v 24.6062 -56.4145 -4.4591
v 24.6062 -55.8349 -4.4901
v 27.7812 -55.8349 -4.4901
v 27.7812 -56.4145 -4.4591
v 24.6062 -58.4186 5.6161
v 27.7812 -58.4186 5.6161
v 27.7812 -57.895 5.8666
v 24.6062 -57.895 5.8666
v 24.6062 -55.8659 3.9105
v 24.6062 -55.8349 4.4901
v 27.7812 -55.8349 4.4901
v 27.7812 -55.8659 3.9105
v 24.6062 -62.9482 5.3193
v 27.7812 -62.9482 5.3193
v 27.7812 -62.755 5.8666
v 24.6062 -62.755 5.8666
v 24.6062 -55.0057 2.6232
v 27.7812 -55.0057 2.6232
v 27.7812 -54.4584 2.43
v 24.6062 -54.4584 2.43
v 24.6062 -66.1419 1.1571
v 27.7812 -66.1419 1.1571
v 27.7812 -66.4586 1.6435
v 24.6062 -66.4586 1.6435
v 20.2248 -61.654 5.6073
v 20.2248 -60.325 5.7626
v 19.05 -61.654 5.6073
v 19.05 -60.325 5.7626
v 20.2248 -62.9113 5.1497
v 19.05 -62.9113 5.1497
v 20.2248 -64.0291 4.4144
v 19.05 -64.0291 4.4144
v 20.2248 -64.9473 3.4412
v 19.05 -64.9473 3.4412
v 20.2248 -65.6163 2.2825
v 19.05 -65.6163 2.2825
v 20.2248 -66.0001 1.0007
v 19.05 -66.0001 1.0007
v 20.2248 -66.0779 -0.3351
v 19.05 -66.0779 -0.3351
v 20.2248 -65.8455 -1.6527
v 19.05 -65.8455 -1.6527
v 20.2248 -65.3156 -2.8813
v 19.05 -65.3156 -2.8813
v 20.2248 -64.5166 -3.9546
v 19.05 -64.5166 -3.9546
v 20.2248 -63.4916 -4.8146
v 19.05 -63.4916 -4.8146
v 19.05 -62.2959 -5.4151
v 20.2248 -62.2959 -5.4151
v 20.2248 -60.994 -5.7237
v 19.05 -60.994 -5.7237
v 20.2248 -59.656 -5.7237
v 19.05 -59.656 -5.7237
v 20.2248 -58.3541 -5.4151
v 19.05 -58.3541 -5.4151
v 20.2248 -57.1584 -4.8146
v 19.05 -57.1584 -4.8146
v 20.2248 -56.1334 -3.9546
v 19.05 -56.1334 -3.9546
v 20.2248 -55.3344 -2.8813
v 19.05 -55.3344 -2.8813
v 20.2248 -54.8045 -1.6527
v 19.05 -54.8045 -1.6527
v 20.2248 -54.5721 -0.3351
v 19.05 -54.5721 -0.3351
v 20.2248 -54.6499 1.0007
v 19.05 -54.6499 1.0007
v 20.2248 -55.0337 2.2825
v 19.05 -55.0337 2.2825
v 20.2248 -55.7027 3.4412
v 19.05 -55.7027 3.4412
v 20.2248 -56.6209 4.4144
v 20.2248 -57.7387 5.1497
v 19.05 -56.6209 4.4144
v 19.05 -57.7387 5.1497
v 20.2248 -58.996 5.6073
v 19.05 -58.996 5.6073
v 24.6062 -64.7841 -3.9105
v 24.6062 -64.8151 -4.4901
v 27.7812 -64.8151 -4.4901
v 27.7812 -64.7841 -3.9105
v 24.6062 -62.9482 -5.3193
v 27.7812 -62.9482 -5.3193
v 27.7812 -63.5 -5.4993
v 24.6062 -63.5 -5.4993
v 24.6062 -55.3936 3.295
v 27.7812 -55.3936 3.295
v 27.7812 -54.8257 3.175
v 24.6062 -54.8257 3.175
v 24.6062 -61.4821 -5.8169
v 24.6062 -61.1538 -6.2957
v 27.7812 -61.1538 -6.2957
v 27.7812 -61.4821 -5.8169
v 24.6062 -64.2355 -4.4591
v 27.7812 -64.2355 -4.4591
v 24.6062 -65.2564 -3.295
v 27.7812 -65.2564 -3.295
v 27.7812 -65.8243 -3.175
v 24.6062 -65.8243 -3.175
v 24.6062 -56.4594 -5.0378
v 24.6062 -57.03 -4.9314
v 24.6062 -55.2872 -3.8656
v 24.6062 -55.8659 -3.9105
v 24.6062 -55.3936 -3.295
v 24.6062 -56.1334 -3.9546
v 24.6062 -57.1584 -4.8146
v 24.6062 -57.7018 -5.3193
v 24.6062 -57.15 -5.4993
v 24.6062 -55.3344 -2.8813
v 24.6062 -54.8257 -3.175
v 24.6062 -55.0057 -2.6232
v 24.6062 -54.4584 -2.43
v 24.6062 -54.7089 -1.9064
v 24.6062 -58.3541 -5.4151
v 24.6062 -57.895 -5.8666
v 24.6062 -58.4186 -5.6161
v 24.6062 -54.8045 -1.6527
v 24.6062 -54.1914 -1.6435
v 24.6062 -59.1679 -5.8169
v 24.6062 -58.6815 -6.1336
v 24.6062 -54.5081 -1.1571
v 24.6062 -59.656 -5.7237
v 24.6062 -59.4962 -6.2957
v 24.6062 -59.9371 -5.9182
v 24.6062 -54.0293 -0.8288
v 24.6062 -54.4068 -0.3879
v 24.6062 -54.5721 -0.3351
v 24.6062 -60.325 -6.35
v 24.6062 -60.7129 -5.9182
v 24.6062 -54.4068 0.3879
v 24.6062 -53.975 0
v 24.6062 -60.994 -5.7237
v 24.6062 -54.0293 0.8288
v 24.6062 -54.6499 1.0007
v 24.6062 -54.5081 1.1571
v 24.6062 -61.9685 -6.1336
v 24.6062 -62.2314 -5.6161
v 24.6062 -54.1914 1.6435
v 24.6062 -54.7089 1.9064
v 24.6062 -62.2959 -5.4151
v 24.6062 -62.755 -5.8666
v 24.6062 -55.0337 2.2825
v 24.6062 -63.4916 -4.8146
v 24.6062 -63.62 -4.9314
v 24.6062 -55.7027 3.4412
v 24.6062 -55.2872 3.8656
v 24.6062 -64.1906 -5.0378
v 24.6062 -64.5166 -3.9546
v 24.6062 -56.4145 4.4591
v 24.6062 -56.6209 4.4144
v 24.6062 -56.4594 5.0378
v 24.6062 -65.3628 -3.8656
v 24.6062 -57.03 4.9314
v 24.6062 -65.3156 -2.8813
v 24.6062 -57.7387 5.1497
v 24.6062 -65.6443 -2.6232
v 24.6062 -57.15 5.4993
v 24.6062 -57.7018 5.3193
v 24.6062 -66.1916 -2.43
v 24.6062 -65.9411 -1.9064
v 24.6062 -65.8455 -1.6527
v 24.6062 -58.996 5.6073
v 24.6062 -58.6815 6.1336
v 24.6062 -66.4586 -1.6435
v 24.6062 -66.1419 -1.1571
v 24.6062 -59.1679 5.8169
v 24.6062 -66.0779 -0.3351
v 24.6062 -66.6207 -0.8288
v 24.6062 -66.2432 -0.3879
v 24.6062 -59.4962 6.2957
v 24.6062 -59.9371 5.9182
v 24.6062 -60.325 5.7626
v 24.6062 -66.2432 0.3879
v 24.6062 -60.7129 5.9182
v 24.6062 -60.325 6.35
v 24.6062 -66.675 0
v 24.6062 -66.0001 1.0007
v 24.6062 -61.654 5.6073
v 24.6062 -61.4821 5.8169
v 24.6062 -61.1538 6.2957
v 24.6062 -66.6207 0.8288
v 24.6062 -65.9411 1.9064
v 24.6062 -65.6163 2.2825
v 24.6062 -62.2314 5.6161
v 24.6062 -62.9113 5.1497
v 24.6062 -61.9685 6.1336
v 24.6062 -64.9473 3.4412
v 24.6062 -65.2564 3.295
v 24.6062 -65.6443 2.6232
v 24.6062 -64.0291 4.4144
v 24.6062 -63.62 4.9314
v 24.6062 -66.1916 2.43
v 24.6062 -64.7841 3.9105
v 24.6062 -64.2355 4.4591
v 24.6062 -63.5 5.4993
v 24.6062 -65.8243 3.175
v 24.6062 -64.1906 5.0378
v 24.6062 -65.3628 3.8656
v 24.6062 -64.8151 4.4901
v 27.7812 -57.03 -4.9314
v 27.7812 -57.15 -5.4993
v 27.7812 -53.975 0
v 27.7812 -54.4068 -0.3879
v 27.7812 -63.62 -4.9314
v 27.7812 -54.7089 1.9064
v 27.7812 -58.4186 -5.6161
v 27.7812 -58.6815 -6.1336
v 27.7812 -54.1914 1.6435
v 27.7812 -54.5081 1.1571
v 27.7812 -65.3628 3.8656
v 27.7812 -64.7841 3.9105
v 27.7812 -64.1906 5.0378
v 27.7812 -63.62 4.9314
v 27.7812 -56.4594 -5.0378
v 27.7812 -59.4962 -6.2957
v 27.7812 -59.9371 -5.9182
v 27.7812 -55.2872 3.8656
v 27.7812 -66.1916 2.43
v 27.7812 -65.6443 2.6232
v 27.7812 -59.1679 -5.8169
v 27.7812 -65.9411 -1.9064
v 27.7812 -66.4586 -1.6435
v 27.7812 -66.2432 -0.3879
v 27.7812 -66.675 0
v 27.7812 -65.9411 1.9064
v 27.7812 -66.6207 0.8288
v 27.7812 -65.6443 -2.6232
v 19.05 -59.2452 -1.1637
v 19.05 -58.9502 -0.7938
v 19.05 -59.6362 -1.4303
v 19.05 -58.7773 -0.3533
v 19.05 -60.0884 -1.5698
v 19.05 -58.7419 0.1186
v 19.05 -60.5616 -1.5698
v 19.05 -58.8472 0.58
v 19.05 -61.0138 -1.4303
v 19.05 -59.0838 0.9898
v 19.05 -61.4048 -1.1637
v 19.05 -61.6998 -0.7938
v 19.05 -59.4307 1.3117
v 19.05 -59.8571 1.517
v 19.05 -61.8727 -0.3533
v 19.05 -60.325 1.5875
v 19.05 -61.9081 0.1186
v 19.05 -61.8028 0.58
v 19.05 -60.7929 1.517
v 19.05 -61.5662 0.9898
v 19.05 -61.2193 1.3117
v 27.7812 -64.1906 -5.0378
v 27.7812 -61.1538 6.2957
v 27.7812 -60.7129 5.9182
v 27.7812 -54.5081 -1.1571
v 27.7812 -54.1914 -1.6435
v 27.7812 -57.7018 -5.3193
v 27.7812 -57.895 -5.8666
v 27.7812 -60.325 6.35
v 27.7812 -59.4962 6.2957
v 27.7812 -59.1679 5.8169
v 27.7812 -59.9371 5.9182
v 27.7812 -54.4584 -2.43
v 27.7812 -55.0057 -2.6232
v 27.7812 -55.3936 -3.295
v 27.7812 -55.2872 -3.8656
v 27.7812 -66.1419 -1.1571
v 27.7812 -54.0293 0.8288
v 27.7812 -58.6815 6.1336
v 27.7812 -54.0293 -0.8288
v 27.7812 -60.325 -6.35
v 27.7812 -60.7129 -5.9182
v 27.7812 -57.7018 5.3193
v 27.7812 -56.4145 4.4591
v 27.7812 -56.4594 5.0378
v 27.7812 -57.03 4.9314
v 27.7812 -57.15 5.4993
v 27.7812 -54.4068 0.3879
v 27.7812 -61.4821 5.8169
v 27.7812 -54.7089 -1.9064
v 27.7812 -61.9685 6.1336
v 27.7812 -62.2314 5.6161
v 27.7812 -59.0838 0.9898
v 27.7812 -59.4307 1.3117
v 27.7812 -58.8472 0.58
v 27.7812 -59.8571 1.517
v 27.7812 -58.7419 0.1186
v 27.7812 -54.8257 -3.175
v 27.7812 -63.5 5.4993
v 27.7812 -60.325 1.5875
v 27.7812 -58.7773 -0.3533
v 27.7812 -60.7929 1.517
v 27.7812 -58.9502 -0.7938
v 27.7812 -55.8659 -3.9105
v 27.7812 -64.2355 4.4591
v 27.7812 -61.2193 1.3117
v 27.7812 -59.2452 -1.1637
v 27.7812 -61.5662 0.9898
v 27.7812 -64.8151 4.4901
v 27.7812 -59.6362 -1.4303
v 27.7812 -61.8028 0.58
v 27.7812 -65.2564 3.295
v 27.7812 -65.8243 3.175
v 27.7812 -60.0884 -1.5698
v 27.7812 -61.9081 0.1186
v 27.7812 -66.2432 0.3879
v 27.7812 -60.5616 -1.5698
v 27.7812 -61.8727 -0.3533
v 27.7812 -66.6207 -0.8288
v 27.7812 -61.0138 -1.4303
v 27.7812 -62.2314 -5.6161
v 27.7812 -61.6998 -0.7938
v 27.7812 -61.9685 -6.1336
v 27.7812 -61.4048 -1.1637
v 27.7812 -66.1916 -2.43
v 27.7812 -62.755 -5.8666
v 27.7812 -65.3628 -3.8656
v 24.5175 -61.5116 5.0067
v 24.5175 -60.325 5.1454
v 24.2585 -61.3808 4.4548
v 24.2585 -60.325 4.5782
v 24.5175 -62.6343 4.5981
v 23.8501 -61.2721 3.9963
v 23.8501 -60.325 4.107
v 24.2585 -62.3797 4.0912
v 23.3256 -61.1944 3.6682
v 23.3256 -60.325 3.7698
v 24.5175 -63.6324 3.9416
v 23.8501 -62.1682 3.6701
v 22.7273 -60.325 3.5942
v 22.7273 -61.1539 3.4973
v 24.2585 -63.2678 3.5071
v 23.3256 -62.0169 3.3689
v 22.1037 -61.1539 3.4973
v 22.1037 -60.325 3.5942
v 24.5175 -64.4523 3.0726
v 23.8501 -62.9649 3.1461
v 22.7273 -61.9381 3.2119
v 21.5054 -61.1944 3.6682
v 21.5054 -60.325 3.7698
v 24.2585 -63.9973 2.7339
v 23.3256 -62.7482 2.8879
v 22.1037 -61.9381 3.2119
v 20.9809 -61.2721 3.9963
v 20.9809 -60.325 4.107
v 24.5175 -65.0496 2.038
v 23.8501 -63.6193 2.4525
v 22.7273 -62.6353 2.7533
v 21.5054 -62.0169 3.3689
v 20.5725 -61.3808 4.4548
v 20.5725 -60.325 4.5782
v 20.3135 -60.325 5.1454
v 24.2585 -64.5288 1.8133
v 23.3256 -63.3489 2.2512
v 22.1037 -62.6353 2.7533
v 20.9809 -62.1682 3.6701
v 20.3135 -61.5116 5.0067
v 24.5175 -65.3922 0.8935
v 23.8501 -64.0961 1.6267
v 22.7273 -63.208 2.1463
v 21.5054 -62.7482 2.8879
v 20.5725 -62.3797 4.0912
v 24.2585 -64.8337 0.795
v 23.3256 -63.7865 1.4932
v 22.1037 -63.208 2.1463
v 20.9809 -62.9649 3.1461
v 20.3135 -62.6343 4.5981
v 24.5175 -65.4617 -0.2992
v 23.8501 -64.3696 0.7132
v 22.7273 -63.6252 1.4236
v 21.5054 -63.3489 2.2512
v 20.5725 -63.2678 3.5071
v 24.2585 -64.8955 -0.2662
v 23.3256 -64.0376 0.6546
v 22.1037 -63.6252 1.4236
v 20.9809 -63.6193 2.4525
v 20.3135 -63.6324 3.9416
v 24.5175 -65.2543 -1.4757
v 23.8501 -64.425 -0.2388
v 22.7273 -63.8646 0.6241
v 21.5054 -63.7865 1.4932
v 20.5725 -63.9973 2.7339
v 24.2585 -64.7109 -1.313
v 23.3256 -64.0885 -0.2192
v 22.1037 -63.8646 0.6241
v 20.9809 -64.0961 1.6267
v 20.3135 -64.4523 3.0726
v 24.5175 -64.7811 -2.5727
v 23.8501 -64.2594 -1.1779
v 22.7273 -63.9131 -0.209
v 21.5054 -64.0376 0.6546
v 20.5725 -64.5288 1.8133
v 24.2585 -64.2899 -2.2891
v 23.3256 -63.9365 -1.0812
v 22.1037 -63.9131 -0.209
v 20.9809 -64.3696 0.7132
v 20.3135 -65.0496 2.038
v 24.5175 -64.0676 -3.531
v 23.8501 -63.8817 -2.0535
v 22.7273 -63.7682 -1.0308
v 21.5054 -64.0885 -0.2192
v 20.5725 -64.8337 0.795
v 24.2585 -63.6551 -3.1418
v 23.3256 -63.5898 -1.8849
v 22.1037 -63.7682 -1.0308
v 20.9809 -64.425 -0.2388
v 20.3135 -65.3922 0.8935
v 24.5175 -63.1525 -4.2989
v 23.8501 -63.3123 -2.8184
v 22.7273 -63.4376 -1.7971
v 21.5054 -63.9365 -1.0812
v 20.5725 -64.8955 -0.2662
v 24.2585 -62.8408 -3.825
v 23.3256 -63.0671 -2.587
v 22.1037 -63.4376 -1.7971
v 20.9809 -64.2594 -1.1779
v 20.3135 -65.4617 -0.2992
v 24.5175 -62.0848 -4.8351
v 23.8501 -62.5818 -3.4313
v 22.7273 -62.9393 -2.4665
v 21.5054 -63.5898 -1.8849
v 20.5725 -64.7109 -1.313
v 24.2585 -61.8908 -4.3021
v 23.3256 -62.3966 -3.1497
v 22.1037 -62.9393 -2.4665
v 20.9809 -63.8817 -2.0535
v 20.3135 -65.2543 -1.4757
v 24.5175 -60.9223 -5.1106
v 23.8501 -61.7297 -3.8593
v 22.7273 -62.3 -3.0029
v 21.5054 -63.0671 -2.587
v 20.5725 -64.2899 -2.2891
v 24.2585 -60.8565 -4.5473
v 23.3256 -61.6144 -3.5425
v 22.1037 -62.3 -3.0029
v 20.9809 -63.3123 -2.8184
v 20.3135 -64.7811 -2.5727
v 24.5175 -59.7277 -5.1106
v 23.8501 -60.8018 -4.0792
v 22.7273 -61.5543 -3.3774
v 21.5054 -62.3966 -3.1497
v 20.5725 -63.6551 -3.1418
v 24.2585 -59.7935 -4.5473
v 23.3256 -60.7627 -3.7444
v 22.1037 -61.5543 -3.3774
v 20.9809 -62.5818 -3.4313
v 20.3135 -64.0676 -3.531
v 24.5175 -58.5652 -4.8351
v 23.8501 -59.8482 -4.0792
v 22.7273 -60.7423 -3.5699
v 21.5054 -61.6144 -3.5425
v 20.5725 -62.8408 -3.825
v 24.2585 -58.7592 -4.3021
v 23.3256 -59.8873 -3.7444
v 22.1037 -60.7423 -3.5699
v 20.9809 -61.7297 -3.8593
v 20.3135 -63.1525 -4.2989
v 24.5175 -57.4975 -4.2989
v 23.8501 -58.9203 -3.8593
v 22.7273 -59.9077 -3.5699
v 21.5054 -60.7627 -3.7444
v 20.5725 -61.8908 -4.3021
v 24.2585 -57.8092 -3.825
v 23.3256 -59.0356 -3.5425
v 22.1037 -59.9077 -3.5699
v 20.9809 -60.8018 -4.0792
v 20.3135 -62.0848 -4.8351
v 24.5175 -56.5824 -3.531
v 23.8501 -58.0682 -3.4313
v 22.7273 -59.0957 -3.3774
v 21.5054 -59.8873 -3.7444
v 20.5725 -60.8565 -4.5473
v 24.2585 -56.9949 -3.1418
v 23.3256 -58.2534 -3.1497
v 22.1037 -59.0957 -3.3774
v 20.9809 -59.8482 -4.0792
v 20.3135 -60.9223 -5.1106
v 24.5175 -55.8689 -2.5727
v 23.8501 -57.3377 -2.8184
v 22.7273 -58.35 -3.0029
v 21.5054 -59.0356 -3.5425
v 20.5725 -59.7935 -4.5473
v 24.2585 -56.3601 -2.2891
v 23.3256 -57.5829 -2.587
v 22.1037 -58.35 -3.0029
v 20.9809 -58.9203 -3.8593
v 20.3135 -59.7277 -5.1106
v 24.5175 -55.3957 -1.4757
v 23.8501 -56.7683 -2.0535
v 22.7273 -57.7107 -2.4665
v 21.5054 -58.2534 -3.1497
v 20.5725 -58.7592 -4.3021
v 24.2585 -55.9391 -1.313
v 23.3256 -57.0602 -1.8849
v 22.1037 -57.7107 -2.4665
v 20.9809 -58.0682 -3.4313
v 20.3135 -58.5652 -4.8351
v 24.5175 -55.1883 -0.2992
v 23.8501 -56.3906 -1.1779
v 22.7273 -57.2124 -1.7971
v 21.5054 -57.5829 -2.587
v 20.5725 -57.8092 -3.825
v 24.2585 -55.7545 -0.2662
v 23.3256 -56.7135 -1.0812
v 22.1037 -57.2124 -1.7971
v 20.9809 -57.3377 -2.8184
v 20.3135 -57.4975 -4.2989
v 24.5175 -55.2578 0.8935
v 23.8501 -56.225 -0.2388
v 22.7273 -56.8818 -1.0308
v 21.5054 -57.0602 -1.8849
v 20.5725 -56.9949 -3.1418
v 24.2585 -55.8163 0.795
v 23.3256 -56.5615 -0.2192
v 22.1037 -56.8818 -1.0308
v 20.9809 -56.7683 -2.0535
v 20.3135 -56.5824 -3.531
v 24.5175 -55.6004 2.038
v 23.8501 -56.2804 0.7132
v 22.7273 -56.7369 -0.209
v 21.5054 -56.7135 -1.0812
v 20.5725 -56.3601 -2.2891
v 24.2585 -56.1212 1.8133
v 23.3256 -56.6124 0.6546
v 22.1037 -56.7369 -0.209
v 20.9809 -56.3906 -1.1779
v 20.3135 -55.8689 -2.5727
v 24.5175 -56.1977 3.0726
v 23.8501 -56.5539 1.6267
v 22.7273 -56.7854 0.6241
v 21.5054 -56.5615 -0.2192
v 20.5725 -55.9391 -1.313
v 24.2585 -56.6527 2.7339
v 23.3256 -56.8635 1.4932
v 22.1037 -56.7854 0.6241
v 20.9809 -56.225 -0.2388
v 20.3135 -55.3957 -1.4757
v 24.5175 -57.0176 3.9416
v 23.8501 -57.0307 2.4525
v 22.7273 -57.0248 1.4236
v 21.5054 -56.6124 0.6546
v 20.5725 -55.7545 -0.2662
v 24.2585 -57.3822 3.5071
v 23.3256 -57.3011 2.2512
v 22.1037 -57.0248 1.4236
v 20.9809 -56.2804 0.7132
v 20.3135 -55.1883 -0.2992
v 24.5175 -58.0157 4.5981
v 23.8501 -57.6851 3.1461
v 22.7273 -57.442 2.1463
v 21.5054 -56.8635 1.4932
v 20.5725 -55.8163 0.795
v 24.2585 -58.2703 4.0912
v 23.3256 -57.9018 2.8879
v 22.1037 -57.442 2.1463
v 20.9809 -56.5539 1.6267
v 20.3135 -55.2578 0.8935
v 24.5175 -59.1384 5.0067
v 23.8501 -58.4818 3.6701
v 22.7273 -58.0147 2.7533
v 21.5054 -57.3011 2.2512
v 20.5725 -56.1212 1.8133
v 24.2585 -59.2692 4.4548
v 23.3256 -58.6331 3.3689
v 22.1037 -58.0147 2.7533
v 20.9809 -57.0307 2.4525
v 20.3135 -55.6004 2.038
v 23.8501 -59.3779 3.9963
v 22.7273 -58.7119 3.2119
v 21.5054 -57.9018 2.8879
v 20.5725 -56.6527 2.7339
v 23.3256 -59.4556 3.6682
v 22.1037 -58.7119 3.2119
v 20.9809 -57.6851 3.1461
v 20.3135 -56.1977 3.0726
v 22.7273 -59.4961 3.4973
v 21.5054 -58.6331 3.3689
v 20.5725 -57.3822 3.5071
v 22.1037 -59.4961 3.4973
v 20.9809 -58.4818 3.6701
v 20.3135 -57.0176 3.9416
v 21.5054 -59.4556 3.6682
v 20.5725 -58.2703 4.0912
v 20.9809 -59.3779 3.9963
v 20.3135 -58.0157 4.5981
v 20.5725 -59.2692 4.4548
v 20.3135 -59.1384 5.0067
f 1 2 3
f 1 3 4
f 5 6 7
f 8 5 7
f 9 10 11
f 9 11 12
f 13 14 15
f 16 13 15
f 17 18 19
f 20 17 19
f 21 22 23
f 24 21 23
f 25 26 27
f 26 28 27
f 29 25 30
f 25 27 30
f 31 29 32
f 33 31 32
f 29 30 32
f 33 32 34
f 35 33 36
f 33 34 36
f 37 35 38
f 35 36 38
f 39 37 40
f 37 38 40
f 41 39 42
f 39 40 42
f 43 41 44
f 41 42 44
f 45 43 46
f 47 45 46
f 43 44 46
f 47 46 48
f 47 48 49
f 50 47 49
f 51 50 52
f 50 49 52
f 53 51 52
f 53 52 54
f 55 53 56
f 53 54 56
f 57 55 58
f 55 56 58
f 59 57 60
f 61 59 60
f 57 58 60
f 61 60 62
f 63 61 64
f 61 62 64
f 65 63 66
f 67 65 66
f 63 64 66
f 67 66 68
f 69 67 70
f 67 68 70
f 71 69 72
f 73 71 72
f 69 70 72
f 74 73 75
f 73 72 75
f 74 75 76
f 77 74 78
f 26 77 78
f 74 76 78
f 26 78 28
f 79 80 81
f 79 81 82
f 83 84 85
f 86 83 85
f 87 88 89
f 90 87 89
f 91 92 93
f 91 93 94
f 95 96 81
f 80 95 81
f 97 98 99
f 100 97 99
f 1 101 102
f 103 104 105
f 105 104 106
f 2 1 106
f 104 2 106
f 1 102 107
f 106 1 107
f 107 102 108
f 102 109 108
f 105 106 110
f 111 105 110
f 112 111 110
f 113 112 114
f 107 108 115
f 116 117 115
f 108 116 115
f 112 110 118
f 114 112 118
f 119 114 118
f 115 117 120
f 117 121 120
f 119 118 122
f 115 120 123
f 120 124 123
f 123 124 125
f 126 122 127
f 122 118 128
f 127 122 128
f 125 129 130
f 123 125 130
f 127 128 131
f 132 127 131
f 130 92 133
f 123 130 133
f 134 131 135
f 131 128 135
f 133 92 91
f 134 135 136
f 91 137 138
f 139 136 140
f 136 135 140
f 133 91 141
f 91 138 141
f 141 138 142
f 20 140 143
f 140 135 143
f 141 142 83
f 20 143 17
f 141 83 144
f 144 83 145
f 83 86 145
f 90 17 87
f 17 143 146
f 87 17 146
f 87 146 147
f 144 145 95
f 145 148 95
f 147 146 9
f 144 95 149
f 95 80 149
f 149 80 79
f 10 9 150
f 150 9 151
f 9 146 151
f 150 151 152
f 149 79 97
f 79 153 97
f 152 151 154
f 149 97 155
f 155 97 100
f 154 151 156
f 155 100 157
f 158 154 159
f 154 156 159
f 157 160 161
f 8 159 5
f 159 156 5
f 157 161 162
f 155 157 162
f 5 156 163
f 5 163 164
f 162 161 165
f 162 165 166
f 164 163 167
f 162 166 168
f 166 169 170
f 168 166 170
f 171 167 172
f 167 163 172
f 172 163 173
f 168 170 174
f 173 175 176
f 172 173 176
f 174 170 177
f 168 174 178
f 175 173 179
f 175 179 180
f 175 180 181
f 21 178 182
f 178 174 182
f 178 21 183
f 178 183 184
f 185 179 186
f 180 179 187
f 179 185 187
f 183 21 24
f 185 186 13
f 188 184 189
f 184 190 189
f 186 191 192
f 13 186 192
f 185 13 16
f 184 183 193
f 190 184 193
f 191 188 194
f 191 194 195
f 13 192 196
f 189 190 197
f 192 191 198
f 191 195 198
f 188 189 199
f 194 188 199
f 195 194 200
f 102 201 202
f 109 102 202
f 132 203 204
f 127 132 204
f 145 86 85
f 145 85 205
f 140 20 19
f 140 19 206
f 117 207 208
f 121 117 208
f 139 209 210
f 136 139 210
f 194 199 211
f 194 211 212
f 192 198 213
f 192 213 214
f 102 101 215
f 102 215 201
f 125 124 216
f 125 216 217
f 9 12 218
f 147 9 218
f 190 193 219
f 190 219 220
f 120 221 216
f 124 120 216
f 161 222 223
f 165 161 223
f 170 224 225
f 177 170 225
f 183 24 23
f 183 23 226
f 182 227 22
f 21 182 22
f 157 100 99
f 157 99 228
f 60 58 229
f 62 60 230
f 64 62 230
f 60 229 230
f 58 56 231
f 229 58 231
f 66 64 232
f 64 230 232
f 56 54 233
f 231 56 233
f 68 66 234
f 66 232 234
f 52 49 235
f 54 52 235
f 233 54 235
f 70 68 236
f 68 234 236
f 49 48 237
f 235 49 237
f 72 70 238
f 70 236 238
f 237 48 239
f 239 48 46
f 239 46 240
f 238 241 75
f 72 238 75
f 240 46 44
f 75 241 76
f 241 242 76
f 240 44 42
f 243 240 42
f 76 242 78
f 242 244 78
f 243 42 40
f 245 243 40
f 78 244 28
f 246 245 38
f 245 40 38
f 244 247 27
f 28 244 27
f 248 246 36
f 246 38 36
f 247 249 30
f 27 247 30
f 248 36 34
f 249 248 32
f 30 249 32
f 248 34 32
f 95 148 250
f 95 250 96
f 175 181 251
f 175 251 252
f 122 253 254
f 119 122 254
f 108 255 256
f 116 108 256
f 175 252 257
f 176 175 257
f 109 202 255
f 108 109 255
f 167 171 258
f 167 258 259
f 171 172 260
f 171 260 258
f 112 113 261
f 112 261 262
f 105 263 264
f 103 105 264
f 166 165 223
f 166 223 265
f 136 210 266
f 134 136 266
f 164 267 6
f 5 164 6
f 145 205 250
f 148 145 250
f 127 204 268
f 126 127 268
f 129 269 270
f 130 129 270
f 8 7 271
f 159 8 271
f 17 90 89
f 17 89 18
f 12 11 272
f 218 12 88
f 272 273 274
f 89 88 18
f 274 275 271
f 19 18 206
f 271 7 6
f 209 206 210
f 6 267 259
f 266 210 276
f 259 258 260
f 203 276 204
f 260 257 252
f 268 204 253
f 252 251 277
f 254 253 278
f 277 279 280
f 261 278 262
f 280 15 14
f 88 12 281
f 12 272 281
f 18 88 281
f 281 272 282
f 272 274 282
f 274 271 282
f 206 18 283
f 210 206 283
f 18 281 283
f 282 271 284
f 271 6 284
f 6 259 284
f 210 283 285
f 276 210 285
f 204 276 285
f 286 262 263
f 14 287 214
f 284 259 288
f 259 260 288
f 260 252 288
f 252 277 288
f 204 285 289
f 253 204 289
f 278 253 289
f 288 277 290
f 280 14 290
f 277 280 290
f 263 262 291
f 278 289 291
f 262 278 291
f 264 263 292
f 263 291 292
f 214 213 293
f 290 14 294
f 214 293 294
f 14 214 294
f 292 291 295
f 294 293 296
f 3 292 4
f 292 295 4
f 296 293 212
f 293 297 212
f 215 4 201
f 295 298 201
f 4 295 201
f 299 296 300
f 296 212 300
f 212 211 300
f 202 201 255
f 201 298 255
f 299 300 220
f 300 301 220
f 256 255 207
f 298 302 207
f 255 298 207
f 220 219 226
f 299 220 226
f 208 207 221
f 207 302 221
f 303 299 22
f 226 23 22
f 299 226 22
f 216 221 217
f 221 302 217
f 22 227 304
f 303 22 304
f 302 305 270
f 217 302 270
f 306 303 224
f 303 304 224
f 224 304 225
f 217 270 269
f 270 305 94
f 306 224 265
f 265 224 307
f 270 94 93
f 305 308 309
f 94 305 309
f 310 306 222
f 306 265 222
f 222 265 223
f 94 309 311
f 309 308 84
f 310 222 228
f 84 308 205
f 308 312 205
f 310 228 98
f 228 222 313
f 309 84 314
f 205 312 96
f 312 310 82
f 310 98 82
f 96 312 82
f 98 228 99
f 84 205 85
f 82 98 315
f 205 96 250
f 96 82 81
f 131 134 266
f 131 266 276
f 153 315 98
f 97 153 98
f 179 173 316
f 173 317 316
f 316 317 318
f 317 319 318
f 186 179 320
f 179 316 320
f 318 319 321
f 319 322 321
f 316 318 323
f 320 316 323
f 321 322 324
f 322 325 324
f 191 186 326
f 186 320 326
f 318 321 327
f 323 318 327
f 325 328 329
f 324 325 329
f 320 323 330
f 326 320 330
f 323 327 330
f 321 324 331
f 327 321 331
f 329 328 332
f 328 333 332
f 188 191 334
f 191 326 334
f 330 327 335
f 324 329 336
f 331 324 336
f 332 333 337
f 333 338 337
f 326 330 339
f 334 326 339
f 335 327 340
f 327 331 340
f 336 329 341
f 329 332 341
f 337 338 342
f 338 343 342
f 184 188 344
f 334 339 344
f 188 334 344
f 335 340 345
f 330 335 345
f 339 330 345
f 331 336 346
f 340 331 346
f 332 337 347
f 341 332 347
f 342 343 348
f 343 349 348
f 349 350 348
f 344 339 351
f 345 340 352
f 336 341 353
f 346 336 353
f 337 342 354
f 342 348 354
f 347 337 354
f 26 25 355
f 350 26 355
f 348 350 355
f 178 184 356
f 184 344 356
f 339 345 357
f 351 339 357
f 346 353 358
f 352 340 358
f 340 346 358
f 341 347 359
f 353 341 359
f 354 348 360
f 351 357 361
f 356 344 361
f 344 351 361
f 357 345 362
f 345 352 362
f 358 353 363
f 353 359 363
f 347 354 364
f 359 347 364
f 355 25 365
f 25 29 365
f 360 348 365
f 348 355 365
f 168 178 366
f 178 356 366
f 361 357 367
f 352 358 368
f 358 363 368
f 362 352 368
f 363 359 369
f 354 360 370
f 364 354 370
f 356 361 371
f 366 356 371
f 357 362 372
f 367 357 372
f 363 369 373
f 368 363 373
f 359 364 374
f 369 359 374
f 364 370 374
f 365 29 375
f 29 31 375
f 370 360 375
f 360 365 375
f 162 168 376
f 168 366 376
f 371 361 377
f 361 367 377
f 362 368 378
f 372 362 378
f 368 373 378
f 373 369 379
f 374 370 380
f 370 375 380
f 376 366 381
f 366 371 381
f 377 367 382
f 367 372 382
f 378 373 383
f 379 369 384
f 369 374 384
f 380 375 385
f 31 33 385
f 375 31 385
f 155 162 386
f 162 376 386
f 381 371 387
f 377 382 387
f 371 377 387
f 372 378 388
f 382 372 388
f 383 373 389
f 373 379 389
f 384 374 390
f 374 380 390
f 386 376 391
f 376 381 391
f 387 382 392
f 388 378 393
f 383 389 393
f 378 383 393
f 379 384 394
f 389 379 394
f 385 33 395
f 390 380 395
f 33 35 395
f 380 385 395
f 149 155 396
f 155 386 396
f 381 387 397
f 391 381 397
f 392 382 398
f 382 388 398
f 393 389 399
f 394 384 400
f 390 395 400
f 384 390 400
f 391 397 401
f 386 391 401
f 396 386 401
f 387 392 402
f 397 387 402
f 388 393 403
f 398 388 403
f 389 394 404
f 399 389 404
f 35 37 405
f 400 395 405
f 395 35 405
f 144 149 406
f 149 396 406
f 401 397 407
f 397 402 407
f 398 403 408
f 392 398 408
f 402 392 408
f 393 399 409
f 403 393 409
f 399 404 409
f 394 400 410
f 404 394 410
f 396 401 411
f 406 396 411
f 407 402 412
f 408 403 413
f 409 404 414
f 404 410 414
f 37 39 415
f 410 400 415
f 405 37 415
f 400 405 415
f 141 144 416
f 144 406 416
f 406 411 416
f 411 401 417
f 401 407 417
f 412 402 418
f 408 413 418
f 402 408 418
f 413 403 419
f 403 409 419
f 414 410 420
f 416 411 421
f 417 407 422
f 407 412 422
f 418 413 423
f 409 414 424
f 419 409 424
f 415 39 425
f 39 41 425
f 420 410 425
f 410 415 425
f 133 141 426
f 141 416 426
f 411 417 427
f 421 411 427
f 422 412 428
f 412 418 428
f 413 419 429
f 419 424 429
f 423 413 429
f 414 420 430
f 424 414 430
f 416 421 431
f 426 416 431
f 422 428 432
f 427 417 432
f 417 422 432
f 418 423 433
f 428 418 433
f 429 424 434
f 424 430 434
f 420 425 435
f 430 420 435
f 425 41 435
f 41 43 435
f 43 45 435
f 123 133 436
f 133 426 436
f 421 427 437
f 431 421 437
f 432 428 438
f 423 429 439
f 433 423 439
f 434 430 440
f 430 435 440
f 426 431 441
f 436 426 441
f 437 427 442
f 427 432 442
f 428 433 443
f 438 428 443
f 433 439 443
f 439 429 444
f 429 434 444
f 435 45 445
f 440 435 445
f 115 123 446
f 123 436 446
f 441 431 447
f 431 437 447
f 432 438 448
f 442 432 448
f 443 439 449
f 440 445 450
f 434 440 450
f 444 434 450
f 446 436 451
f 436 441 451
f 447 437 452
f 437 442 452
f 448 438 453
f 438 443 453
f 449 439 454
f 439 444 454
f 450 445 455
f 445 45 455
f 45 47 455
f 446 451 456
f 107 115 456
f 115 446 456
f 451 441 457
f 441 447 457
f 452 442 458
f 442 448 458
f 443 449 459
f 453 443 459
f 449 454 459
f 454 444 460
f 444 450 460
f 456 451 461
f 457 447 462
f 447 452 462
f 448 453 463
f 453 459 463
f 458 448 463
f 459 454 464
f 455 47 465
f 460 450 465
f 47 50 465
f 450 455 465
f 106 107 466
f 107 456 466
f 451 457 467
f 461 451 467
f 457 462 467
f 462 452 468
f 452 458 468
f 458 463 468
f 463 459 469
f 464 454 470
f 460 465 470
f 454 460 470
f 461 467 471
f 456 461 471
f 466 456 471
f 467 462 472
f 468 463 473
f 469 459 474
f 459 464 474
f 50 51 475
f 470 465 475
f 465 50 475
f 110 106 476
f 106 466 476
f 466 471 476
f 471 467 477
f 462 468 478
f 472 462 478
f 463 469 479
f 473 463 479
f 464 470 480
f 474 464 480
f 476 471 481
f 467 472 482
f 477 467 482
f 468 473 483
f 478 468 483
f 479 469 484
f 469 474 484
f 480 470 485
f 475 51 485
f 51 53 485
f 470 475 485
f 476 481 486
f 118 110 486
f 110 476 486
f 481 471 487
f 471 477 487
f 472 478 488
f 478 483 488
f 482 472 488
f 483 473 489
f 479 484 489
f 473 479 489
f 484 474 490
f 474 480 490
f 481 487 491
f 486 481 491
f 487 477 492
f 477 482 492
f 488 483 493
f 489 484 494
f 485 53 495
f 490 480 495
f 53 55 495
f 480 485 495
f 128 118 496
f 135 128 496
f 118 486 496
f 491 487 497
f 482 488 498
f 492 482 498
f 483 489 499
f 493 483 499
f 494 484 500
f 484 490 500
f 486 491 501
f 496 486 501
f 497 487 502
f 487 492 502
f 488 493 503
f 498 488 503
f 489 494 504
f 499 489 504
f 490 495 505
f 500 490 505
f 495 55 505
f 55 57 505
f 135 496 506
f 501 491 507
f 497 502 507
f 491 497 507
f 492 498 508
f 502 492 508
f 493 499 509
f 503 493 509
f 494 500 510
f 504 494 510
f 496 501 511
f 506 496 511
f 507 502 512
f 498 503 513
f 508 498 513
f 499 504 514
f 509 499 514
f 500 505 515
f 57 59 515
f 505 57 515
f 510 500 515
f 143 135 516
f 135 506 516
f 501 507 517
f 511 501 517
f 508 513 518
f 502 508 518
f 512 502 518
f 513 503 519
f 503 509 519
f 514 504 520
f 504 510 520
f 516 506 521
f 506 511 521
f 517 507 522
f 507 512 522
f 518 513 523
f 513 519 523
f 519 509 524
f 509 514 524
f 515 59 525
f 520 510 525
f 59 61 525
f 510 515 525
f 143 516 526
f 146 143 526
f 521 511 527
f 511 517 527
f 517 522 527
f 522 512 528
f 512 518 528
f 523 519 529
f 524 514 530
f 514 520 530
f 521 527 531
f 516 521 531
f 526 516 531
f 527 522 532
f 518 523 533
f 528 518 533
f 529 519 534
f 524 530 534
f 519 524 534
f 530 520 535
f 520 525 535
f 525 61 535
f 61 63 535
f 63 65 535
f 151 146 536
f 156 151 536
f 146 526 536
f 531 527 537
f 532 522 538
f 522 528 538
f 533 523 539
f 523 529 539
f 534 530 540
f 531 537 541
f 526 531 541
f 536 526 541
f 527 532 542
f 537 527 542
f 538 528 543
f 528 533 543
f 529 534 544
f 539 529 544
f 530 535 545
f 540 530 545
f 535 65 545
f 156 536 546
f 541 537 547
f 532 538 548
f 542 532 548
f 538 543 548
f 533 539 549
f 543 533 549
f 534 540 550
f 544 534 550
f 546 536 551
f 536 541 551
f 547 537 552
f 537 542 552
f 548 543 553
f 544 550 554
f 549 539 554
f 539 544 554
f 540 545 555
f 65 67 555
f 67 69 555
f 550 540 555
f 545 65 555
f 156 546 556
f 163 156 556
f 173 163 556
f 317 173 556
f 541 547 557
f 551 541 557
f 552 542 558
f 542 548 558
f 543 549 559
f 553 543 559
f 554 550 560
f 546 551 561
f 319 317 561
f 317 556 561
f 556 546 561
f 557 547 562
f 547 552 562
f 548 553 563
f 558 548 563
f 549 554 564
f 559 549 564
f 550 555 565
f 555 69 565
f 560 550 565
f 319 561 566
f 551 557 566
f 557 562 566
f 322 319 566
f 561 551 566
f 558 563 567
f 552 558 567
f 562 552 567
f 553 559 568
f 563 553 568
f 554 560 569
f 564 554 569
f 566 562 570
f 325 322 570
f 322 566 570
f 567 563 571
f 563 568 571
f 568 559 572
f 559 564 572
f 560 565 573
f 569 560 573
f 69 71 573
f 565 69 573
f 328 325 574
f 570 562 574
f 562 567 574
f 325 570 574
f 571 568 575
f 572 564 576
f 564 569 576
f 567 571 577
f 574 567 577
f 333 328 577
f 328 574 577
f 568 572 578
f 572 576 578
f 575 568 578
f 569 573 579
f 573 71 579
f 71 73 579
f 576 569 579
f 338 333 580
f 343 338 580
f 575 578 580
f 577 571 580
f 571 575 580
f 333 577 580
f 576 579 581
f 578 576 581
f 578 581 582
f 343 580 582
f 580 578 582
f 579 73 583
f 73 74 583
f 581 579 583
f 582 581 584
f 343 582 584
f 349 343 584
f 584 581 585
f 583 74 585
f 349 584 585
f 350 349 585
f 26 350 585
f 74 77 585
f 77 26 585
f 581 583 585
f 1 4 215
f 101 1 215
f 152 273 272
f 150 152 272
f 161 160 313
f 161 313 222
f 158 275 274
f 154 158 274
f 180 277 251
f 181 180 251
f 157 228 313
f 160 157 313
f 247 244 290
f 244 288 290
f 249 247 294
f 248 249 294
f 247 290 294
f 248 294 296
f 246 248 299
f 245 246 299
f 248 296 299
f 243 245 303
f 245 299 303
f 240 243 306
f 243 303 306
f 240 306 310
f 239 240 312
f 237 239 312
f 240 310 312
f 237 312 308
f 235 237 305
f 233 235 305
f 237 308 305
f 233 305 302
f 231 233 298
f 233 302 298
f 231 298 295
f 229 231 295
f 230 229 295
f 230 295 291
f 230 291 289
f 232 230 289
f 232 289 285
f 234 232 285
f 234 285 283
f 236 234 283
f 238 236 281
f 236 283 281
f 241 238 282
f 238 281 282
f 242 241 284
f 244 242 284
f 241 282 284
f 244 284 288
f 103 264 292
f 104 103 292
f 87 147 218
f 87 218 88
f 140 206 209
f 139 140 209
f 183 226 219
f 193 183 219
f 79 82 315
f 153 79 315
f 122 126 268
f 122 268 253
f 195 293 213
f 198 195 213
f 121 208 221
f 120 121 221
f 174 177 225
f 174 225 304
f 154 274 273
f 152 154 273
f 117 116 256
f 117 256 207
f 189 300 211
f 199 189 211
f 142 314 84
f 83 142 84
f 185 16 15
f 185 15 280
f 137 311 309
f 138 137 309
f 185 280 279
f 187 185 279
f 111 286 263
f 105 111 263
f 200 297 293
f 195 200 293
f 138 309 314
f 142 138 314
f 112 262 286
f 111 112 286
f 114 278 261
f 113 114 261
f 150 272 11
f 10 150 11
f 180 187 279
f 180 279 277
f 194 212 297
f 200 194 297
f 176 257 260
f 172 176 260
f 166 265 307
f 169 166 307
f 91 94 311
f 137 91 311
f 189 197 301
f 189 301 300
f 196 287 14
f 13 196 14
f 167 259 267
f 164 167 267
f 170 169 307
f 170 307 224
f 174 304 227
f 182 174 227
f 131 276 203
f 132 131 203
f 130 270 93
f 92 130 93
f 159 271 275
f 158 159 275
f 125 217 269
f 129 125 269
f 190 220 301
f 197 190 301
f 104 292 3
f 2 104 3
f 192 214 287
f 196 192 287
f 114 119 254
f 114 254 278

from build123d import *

# Parameters (mm, degrees)
F4_DEPTH        = 3.175
F4_COPIES_COUNT = 48


# Not quite as in the source:
# - a pattern or mirror of a feature is missing from the dataset's text; its kind, count and spacing are read off the source's solid


with BuildPart() as f2:
    # F1 (on offset) → F2 (revolve)
    with BuildSketch(Plane.XZ.offset(60.325)):
        with BuildLine():
            Line((19.05, 5.762625), (19.05, 1.5875))
            Line((19.05, 1.5875), (27.78125, 1.5875))
            Line((27.78125, 1.5875), (27.78125, 6.35))
            Line((27.78125, 6.35), (24.60625, 6.35))
            Line((24.60625, 6.35), (24.60625, 5.762625))
            ThreePointArc((24.60625, 5.762625), (22.4155, 3.571875), (20.22475, 5.762625))
            Line((20.22475, 5.762625), (19.05, 5.762625))
        make_face()
    revolve(axis=Axis((0, -60.325, 0), (1, 0, 0)))

    # F3 (on face) → F4 (cut, through all)
    with BuildSketch(Plane.YZ.offset(27.78125)):
        with BuildLine():
            ThreePointArc((-59.4961586794, 6.2956748697), (-59.9096901294, 6.3364041626), (-60.325, 6.35))
            Line((-60.325, 6.35), (-59.9371006784, 5.9182))
            Line((-59.9371006784, 5.9182), (-59.4961586794, 6.2956748697))
        make_face()
    f4 = extrude(amount=-F4_DEPTH, mode=Mode.SUBTRACT)

    # F4_copies: F4 ×48 about axis
    f4_copies_axis = Axis((0, -60.325, 0), (1, 0, 0))
    for i in range(1, F4_COPIES_COUNT):
        add(f4.rotate(f4_copies_axis, i * 360 / F4_COPIES_COUNT), mode=Mode.SUBTRACT)


solid = f2.part
